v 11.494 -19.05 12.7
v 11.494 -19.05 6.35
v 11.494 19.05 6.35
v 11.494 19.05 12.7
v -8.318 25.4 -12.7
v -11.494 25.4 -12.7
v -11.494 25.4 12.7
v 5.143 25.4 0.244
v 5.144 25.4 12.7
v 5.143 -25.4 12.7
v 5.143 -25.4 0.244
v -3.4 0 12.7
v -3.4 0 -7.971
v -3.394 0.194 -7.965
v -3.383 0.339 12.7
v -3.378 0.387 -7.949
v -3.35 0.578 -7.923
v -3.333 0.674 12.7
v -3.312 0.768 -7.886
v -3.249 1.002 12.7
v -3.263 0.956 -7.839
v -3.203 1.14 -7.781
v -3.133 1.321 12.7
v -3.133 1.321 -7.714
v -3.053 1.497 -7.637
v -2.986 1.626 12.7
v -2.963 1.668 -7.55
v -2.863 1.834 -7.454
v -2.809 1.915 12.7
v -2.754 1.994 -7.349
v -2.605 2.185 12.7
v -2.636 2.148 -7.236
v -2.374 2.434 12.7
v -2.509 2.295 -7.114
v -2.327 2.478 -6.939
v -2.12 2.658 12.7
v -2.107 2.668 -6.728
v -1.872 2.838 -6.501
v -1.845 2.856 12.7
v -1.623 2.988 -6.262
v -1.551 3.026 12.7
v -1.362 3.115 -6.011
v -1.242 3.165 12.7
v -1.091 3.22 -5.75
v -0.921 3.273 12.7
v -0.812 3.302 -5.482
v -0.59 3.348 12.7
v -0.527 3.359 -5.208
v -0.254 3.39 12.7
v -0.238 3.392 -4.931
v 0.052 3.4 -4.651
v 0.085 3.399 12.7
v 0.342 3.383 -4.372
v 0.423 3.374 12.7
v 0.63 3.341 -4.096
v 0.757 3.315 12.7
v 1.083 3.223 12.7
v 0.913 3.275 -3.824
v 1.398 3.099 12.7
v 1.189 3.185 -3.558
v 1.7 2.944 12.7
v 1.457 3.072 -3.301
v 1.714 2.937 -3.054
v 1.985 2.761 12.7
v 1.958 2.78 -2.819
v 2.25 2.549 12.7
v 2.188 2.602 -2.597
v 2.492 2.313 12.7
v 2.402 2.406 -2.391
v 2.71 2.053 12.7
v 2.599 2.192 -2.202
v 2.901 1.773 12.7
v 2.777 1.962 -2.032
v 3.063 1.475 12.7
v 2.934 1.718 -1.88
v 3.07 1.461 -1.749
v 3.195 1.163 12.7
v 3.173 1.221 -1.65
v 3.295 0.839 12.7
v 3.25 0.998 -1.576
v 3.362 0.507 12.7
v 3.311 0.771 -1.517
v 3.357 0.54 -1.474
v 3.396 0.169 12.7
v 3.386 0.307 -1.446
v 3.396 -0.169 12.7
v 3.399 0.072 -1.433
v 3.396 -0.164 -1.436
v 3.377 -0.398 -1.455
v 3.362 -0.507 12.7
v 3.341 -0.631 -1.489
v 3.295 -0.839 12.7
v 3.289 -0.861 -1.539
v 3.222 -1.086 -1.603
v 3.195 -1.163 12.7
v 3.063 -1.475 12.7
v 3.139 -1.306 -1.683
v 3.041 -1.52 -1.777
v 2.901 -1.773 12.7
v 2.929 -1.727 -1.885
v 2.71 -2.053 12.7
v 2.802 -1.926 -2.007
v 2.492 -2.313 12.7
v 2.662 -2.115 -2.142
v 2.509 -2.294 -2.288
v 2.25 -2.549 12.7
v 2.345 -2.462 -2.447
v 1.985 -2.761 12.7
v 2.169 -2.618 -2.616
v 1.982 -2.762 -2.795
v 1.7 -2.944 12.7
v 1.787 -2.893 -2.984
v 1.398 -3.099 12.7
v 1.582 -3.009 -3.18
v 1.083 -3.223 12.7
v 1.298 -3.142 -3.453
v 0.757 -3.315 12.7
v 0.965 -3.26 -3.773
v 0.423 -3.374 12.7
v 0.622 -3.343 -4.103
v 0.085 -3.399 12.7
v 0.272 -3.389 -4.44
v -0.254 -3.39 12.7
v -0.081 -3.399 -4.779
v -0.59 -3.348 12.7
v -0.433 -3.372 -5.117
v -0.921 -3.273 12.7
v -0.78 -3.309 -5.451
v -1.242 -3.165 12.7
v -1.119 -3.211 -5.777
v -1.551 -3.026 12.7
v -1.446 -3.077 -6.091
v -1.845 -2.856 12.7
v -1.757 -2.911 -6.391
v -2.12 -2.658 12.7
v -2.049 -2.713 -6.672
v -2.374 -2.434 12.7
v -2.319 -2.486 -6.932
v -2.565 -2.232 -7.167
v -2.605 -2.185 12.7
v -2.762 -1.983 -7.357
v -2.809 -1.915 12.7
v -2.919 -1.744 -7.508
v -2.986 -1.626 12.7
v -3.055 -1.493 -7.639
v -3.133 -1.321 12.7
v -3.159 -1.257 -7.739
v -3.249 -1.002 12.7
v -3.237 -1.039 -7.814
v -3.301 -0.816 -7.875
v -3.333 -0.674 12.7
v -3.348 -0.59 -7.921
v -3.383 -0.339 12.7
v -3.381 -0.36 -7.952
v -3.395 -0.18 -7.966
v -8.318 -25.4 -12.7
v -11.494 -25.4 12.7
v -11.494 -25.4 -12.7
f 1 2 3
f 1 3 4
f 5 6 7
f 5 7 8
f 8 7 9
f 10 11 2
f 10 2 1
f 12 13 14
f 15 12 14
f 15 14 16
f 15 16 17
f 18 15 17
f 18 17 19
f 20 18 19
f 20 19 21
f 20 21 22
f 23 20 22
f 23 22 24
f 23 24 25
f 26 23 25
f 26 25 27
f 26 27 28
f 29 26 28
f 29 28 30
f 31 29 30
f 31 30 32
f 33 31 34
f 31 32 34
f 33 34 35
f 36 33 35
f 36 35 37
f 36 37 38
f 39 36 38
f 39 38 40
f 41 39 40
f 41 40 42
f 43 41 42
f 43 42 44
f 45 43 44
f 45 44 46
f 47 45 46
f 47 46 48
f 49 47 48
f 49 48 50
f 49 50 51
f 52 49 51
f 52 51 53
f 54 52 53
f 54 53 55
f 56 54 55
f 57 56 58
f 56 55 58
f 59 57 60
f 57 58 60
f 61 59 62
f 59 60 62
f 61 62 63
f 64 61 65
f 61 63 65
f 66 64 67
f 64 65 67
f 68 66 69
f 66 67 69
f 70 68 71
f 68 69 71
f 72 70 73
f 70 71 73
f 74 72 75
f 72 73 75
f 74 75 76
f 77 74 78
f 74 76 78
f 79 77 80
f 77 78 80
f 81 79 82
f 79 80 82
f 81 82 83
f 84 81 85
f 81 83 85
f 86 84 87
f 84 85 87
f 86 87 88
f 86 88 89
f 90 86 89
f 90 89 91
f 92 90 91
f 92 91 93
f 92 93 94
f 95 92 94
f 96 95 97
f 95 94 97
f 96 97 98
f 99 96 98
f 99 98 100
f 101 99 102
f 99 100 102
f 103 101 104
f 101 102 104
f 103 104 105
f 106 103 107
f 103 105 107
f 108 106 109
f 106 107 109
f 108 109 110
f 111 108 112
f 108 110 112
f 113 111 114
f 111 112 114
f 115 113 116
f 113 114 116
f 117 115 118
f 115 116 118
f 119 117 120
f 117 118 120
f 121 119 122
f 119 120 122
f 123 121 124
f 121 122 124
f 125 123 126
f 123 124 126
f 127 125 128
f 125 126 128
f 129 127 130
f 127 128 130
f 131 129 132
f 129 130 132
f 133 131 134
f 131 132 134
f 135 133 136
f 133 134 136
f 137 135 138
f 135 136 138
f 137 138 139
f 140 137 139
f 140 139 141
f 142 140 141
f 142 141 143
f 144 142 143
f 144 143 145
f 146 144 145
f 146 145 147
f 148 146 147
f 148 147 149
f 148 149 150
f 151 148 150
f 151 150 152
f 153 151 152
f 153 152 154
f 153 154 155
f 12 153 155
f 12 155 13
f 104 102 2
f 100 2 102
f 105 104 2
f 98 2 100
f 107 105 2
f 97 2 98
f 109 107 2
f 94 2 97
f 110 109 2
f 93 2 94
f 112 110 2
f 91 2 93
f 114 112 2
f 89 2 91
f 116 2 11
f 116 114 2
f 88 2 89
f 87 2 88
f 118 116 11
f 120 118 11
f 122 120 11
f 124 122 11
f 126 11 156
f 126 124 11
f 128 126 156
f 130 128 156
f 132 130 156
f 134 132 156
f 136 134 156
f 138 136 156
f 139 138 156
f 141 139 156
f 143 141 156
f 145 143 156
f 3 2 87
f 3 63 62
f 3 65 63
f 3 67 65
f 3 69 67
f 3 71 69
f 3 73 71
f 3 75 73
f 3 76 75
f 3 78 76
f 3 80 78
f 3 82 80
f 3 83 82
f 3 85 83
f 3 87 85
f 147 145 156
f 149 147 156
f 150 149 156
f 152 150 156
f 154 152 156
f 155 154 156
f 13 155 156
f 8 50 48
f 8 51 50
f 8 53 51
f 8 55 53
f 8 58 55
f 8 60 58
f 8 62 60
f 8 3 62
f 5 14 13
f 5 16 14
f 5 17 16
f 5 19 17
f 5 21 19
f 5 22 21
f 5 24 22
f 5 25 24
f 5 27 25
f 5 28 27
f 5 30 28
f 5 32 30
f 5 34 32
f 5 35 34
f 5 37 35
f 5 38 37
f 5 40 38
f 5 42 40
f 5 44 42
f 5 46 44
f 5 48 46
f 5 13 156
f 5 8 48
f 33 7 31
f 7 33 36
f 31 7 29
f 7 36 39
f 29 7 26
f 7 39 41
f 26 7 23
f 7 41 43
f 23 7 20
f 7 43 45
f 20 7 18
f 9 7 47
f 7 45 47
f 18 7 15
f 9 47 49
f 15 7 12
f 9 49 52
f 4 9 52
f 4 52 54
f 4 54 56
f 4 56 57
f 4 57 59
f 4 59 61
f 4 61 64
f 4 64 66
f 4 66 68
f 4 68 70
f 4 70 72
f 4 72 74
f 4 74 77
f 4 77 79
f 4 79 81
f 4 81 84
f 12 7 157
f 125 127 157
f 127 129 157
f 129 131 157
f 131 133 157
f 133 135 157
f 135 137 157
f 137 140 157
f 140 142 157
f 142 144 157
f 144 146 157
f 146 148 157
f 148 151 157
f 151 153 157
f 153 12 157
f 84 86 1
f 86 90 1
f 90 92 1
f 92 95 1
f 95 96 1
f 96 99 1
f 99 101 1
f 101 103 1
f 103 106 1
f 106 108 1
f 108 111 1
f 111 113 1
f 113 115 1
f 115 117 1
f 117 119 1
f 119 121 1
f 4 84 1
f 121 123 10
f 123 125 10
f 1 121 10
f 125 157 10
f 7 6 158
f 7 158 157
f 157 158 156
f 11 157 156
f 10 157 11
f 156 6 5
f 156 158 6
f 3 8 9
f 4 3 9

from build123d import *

# Parameters (mm, degrees)
F0_W        = 22.987
F0_H        = 25.4
F1_DEPTH    = 25.4
F3_D        = 6.8
F4_SIZE     = 6.35
F5_SIZE     = 6.35
F6_T1_DEPTH = 140.0532259942


# Not quite as in the source:
# - a fillet or chamfer that OpenCascade refuses, or shapes differently, is made with other operations: its cross-section is extruded or revolved along the edge and cut away or added


with BuildPart() as f1:
    # F0 (on Front) → F1 (new body, symmetric)
    with BuildSketch(Plane.XZ):
        Rectangle(F0_W, F0_H)
    extrude(amount=F1_DEPTH, both=True)

    # F3 (through all)
    with Locations(Plane.XY.offset(12.7)):
        with Locations((0, 0)):
            Hole(F3_D / 2)

    # F4
    f4_edges = [f1.edges().sort_by_distance(p)[0] for p in [
        (11.4935, -25.4, 0),
    ]]
    chamfer(f4_edges, length=F4_SIZE)

    # F5
    f5_edges = [f1.edges().sort_by_distance(p)[0] for p in [
        (11.4935, 25.4, 0),
    ]]
    chamfer(f5_edges, length=F5_SIZE)

    # F6: chamfer of 19.05 x 19.812 on 1 edges, made by hand

    # F6_s2 → F6_t1 (cut)
    with BuildSketch(Plane.XZ.offset(-70.0266129971)):
        Polygon((11.4935, 6.35), (-8.3185, -12.7), (11.4935, -12.7), align=None)
    extrude(amount=F6_T1_DEPTH, mode=Mode.SUBTRACT)


solid = f1.part
